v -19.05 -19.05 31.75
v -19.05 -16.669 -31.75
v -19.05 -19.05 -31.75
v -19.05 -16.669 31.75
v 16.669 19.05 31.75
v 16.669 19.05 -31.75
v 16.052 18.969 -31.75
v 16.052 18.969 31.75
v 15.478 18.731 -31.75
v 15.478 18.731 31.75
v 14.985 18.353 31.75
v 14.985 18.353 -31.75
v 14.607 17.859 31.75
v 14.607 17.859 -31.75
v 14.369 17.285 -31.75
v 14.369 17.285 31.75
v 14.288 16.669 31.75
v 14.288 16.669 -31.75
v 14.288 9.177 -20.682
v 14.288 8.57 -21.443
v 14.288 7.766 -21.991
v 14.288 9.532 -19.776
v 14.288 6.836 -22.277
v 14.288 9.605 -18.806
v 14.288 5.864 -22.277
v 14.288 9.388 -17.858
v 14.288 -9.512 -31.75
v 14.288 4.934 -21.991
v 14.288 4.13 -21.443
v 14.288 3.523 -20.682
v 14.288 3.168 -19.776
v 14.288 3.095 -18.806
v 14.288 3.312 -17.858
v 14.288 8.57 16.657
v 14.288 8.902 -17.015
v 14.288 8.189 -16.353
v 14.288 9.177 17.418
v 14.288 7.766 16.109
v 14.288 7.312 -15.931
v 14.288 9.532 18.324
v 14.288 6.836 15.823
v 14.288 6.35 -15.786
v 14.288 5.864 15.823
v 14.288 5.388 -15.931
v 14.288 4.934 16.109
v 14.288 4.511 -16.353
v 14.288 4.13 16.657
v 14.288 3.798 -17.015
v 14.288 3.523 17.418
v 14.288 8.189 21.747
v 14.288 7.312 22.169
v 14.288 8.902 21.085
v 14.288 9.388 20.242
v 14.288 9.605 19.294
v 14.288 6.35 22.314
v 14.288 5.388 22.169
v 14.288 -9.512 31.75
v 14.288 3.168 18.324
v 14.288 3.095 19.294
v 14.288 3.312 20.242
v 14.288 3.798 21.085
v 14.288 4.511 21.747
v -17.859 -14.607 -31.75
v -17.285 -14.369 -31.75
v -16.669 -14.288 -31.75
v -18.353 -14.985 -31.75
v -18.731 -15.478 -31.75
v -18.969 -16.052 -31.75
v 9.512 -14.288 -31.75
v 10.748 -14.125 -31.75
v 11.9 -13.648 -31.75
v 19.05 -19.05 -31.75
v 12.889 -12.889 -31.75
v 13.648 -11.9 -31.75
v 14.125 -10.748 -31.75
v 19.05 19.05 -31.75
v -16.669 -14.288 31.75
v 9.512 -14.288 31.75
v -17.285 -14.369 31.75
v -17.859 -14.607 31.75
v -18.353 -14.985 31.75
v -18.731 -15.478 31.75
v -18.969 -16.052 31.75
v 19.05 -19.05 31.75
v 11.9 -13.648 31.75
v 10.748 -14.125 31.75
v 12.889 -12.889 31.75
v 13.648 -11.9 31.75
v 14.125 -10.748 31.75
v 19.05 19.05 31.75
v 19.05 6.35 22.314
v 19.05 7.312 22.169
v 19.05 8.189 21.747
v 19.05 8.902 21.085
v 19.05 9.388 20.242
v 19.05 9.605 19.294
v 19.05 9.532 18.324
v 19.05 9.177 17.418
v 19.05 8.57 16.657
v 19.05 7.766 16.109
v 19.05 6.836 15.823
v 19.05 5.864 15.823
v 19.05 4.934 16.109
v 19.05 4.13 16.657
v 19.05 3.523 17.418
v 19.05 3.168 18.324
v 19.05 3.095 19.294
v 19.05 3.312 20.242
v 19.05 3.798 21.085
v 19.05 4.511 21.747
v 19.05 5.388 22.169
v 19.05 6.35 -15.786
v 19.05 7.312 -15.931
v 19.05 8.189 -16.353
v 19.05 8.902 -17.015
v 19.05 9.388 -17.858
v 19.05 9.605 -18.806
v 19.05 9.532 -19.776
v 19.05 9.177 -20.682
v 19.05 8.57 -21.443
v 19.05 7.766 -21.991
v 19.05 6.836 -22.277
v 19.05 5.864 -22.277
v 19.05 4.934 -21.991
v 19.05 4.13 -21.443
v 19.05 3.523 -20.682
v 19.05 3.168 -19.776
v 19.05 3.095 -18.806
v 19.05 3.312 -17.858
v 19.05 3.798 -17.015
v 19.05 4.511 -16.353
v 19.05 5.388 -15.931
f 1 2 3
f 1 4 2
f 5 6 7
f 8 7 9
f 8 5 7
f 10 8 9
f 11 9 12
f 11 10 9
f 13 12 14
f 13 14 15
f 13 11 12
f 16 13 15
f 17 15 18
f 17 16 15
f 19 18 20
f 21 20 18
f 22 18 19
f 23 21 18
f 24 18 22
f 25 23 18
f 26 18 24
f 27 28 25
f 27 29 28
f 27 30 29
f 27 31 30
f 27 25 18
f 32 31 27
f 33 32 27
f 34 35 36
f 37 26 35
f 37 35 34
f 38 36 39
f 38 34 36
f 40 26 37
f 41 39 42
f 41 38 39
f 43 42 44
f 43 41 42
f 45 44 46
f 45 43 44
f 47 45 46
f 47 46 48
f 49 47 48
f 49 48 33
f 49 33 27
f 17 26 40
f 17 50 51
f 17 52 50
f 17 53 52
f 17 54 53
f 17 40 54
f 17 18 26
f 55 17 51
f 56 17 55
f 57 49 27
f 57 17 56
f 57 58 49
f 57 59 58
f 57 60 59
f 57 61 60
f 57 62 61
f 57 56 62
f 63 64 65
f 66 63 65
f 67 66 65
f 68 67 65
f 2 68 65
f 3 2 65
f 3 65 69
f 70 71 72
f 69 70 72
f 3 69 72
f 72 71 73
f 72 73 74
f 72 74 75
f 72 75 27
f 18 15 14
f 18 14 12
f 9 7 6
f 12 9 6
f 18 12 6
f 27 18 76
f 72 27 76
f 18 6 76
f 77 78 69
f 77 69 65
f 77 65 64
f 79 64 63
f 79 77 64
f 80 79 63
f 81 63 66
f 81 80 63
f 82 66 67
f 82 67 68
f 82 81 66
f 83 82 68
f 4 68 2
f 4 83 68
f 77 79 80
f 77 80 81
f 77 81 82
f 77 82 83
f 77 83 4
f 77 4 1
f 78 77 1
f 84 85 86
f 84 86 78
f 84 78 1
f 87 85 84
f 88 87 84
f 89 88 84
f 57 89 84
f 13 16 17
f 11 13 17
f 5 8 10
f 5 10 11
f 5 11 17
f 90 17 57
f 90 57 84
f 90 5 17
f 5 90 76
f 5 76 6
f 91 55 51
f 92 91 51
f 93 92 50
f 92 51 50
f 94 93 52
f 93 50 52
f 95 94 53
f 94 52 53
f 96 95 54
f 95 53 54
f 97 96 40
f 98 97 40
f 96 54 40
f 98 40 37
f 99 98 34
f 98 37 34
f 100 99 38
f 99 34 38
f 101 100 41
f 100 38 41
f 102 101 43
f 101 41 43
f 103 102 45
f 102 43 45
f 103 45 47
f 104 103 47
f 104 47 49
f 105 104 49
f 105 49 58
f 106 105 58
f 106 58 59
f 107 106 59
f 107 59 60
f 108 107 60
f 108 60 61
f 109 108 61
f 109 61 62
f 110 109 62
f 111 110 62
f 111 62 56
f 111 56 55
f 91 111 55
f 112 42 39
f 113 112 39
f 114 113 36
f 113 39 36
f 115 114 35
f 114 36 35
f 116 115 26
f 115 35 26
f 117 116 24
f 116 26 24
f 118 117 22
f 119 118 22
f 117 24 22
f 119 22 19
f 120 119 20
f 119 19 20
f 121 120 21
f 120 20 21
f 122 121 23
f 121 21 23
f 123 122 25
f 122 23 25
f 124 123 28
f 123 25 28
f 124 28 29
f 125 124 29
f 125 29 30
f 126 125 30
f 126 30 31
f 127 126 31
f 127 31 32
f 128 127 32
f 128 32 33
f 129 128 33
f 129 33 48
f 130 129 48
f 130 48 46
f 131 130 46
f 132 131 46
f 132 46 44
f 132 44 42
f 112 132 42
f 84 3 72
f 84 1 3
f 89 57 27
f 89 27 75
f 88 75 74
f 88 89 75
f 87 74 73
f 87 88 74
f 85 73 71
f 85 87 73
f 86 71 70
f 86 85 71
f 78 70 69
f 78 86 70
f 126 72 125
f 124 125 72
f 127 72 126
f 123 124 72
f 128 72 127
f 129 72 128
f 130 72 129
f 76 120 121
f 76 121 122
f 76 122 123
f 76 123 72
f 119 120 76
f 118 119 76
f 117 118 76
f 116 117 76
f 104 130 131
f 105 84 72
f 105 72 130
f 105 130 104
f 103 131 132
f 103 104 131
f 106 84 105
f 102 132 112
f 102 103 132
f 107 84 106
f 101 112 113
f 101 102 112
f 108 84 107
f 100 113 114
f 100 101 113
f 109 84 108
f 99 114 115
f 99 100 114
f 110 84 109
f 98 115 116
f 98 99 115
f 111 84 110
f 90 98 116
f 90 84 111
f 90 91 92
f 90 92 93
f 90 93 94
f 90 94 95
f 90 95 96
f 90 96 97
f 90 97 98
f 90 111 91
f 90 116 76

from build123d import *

# Parameters (mm, degrees)
BOSS_EXTRUDE1_DEPTH = 31.75
CUT_EXTRUDE1_REACH  = 6.762
SKETCH5_R           = 3.2639


with BuildPart() as part:
    # Sketch2 → Boss-Extrude1 (new body, symmetric)
    with BuildSketch(Plane.XY):
        with BuildLine():
            Line((-19.05, -19.05), (19.05, -19.05))
            Line((19.05, -19.05), (19.05, 19.05))
            Line((19.05, 19.05), (16.66875, 19.05))
            ThreePointArc((16.66875, 19.05), (14.984951977, 18.352548023), (14.2875, 16.66875))
            Line((14.2875, 16.66875), (14.2875, -9.5123))
            ThreePointArc((14.2875, -9.5123), (12.888876302, -12.888876302), (9.5123, -14.2875))
            Line((9.5123, -14.2875), (-16.66875, -14.2875))
            ThreePointArc((-16.66875, -14.2875), (-18.352548023, -14.984951977), (-19.05, -16.66875))
            Line((-19.05, -16.66875), (-19.05, -19.05))
        make_face()
    extrude(amount=BOSS_EXTRUDE1_DEPTH, both=True)

    # Sketch5 → Cut-Extrude1 (cut, up to next)
    with BuildSketch(Plane.ZY.offset(-14.2875), mode=Mode.PRIVATE) as cut_extrude1_sk1:
        with Locations((-19.05, 6.35)):
            Circle(SKETCH5_R)
    cut_extrude1_tool1 = extrude(cut_extrude1_sk1.sketch, amount=-CUT_EXTRUDE1_REACH, mode=Mode.PRIVATE) & part.part
    add(cut_extrude1_tool1.solids().sort_by_distance((14.2875, 6.35, -19.05))[0], mode=Mode.SUBTRACT)
    # Sketch5 → Cut-Extrude1 (cut, up to next)
    with BuildSketch(Plane.ZY.offset(-14.2875), mode=Mode.PRIVATE) as cut_extrude1_sk2:
        with Locations((19.05, 6.35)):
            Circle(SKETCH5_R)
    cut_extrude1_tool2 = extrude(cut_extrude1_sk2.sketch, amount=-CUT_EXTRUDE1_REACH, mode=Mode.PRIVATE) & part.part
    add(cut_extrude1_tool2.solids().sort_by_distance((14.2875, 6.35, 19.05))[0], mode=Mode.SUBTRACT)


solid = part.part
